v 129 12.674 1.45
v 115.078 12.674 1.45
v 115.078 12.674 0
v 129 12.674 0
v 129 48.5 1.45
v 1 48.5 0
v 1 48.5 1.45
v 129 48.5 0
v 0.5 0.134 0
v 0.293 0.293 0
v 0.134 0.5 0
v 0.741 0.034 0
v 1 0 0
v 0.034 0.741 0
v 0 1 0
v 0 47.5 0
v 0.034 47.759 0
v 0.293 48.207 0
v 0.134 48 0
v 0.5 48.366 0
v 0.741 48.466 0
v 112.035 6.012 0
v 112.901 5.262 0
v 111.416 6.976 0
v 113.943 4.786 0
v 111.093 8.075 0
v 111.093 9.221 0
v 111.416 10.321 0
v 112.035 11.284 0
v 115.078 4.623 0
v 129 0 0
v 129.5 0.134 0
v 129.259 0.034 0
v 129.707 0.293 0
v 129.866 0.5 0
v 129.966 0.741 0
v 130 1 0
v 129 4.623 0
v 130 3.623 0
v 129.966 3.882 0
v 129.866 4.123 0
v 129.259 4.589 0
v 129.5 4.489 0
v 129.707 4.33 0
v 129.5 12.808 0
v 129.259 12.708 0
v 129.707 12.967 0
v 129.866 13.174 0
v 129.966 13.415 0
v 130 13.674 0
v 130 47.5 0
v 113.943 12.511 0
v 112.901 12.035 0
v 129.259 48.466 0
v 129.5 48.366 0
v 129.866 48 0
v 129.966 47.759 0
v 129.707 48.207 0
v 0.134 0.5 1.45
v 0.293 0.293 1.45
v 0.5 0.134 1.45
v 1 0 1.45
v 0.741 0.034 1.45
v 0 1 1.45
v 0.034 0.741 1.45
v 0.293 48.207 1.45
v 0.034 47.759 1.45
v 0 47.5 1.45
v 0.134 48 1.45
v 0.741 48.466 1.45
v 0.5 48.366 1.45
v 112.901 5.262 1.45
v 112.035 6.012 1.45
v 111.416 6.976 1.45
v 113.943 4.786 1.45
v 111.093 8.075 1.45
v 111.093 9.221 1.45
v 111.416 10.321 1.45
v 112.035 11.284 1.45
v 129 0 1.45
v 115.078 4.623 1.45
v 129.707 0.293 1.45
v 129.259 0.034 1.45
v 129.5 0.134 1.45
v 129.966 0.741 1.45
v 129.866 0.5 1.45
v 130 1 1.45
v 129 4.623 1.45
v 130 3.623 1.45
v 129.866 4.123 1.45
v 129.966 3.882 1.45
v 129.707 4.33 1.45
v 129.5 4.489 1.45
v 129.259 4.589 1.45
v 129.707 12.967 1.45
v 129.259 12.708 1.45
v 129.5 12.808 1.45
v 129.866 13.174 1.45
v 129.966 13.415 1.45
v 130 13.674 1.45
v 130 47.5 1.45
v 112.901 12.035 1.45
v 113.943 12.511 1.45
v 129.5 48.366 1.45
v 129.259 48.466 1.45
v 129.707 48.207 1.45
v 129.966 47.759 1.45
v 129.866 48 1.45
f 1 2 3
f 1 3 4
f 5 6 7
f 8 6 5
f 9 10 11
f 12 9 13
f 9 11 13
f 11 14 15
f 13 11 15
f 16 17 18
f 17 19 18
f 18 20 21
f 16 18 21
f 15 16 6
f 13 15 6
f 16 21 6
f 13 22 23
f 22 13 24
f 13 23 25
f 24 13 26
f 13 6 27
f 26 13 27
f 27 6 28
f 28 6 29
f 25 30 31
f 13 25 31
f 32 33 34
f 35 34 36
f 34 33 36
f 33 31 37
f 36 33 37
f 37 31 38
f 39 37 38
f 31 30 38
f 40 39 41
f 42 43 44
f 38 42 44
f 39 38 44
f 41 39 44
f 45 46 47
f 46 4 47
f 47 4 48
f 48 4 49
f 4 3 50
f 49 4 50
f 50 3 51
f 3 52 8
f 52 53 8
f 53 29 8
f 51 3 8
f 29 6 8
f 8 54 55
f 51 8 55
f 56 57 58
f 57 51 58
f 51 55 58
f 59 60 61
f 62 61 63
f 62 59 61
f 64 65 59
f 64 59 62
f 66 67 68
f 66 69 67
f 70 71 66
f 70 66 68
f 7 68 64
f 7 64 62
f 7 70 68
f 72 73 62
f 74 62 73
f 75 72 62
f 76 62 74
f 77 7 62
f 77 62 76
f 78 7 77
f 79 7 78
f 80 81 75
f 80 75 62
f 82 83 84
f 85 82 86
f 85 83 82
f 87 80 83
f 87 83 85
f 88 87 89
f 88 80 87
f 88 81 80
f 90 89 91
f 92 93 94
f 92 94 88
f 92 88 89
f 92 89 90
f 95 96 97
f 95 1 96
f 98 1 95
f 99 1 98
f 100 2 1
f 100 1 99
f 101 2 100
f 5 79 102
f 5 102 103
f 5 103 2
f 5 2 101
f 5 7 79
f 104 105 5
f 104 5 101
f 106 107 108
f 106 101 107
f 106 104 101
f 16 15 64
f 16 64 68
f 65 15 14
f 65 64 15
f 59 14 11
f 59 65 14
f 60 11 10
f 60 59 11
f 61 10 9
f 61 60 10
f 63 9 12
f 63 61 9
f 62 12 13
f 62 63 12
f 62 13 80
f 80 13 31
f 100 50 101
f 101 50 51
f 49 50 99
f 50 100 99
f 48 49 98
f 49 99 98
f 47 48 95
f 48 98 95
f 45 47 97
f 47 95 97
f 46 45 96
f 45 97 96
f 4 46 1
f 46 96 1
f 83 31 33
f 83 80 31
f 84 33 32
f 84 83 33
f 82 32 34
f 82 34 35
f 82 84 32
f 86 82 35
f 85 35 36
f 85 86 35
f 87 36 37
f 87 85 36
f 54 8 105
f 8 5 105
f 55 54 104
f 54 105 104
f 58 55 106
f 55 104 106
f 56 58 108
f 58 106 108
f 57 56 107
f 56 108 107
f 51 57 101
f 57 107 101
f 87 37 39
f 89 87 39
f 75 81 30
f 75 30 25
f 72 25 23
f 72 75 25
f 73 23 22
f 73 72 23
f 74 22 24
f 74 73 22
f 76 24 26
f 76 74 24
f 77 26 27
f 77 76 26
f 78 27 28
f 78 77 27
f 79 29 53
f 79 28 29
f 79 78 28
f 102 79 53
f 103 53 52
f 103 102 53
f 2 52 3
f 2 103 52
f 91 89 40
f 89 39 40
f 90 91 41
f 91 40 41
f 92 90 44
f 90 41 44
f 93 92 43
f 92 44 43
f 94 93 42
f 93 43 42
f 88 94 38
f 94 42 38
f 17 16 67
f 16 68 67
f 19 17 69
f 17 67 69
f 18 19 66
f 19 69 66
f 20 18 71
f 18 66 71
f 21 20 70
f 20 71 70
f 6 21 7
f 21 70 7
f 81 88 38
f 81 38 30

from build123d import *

# Parameters (mm, degrees)
SCHIZZO1_W                   = 130
SCHIZZO1_H                   = 48.5
ESTRUSIONE_ESTRUSIONE1_DEPTH = 1.45
TAGLIO_ESTRUSIONE1_DEPTH     = 12
RACCORDO1_R                  = 1


with BuildPart() as part:
    # Schizzo1 → Estrusione-Estrusione1 (new body)
    with BuildSketch(Plane.XY):
        with Locations((65, 24.25)):
            Rectangle(SCHIZZO1_W, SCHIZZO1_H)
    extrude(amount=ESTRUSIONE_ESTRUSIONE1_DEPTH)

    # Schizzo2 → Taglio-Estrusione1 (cut)
    with BuildSketch(Plane.XY.offset(1.45)):
        with BuildLine():
            Line((144.922454277, 4.622930456), (115.077545723, 4.622930456))
            ThreePointArc((115.077545723, 4.622930456), (111.052124488, 8.64835169), (115.077545723, 12.673772925))
            Line((115.077545723, 12.673772925), (144.922454277, 12.673772925))
            ThreePointArc((144.922454277, 12.673772925), (148.947875512, 8.64835169), (144.922454277, 4.622930456))
        make_face()
    extrude(amount=-TAGLIO_ESTRUSIONE1_DEPTH, mode=Mode.SUBTRACT)

    # Raccordo1
    raccordo1_edges = [part.edges().sort_by_distance(p)[0] for p in [
        (130, 4.622930456, 0.725),
        (130, 12.673772925, 0.725),
        (0, 48.5, 0.725),
        (130, 48.5, 0.725),
        (130, 0, 0.725),
        (0, 0, 0.725),
    ]]
    fillet(raccordo1_edges, radius=RACCORDO1_R)


solid = part.part
